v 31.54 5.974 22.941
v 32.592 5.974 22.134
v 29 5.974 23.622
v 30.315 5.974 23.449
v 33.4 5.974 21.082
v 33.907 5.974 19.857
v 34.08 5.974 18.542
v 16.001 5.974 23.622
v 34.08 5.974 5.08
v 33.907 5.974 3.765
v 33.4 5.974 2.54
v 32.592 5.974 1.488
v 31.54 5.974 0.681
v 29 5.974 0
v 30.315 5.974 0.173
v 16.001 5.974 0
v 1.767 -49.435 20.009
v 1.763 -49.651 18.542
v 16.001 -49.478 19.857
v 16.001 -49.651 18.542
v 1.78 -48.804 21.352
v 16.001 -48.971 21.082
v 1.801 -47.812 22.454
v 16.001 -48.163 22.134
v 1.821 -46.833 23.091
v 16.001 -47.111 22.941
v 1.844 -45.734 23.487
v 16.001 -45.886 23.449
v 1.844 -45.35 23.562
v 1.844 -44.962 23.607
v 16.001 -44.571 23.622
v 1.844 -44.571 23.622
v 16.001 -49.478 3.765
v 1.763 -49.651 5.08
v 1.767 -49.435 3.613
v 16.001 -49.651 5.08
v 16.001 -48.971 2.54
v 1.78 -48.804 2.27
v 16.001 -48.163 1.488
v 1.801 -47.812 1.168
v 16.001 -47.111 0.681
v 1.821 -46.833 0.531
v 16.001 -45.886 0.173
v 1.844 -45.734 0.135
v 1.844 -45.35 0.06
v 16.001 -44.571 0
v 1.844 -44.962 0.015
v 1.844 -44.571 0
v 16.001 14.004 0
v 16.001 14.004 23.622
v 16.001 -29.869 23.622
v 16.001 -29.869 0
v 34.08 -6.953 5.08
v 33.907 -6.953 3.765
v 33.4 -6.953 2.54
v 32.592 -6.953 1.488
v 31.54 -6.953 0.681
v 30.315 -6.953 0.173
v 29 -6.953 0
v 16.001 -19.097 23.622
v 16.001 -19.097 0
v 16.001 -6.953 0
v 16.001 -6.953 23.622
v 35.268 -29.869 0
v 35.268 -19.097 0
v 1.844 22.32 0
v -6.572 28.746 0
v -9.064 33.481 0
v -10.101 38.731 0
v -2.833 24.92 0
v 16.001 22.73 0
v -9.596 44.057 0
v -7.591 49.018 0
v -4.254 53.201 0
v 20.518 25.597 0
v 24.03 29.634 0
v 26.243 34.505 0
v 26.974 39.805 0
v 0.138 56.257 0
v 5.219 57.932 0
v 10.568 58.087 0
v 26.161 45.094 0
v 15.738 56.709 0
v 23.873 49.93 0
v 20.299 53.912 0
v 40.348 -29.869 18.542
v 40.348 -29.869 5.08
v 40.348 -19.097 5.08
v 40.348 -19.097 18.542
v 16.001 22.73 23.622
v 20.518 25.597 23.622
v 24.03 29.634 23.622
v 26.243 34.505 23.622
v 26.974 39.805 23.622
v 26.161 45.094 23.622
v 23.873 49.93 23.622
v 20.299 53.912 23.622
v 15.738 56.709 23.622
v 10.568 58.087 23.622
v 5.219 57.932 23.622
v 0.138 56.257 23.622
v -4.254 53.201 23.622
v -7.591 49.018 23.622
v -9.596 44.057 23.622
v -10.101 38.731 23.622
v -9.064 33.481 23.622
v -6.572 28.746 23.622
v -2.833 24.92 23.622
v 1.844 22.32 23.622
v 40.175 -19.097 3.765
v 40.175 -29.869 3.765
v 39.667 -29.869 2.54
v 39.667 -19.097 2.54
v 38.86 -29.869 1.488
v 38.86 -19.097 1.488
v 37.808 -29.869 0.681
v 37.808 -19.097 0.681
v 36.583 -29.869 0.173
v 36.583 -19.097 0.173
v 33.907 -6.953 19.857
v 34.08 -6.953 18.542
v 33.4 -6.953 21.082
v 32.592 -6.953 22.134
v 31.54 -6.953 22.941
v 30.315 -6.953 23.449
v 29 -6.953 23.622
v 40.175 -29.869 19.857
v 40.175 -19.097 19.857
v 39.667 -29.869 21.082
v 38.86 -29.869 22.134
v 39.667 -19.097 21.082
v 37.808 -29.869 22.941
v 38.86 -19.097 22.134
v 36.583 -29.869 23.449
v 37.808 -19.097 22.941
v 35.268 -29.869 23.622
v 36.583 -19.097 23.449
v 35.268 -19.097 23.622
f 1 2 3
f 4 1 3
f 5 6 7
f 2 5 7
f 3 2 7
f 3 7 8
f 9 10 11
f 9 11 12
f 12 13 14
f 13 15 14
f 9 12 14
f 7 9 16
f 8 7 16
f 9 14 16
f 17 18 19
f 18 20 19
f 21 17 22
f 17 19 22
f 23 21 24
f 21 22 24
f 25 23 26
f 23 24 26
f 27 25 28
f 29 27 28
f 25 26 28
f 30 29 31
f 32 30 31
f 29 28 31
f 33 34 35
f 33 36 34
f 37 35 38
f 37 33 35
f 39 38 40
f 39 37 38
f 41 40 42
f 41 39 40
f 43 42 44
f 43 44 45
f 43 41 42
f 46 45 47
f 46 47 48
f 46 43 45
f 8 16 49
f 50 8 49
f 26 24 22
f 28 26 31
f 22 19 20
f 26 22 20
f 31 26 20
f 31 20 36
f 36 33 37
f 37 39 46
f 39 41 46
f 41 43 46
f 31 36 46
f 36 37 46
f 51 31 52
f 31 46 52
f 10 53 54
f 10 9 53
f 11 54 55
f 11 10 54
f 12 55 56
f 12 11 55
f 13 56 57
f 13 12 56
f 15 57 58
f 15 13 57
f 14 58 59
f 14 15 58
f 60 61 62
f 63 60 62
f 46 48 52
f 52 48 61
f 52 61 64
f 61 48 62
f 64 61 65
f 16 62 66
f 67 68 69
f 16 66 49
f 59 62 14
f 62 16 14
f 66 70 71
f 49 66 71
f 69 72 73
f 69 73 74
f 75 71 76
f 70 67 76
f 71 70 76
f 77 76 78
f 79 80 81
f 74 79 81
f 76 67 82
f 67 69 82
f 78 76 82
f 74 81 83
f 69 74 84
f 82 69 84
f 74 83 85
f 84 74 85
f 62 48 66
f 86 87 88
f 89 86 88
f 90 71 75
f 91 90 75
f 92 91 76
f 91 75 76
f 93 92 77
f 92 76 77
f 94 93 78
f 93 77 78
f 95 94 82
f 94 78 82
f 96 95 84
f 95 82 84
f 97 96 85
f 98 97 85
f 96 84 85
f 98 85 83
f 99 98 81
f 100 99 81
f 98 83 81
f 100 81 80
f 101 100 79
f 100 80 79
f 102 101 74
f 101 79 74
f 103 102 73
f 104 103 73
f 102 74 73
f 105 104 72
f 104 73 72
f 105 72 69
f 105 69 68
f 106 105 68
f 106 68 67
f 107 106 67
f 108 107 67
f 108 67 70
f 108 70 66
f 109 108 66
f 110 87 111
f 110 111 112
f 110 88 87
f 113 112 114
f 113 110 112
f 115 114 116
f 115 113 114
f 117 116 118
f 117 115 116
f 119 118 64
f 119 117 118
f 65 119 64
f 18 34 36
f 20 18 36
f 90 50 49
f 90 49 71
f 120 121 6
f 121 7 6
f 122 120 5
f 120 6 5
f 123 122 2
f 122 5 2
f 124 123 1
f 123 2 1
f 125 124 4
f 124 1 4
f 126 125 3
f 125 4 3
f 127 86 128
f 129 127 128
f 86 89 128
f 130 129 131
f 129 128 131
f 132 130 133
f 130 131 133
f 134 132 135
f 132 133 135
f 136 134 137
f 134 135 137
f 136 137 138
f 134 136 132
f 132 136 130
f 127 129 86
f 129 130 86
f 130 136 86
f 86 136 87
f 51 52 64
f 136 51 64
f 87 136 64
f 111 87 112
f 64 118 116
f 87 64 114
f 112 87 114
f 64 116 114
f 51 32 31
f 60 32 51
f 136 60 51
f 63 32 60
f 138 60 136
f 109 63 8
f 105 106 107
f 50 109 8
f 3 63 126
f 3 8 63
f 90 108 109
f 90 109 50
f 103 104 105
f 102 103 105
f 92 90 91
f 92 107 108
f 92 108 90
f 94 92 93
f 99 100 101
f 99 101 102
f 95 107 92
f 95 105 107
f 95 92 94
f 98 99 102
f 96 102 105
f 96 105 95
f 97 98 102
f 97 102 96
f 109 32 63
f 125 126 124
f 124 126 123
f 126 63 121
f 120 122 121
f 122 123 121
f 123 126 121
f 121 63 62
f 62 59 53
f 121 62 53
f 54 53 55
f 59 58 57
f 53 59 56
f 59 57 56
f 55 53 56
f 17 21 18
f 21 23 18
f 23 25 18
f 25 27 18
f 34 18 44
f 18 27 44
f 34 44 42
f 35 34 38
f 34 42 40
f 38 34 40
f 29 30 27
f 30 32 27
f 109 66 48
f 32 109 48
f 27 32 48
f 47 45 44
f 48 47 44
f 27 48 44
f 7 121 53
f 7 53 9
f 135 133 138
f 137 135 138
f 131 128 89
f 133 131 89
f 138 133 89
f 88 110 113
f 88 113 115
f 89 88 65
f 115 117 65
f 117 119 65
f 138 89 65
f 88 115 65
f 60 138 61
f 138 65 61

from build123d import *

# Parameters (mm, degrees)
F1_DEPTH = 23.622
F2_R     = 5.08


with BuildPart() as f1:
    # F0 (on Top) → F1 (new body)
    with BuildSketch(Plane.XY):
        with BuildLine():
            Line((16.000509, 14.004066), (16.000509, 22.72998))
            ThreePointArc((16.000509, 22.72998), (7.887729, 58.203177), (1.843651, 22.31956))
            Line((1.843651, 22.31956), (1.843651, -45.733988))
            Line((1.843651, -45.733988), (1.762765, -49.65125))
            Line((1.762765, -49.65125), (16.000544, -49.65125))
            Line((16.000544, -49.65125), (16.000544, -29.869115))
            Line((16.000544, -29.869115), (40.347772, -29.869094))
            Line((40.347772, -29.869094), (40.347763, -19.096614))
            Line((40.347763, -19.096614), (16.000538, -19.096635))
            Line((16.000538, -19.096635), (16.000544, -6.953149))
            Line((16.000544, -6.953149), (34.080159, -6.953133))
            Line((34.080159, -6.953133), (34.080148, 5.973834))
            Line((34.080148, 5.973834), (16.000516, 5.973818))
            Line((16.000516, 5.973818), (16.000509, 14.004066))
        make_face()
    extrude(amount=F1_DEPTH)

    # F2
    f2_edges = [f1.edges().sort_by_distance(p)[0] for p in [
        (40.347768, -24.482854, 23.622),
        (34.080154, -0.48965, 23.622),
        (8.881655, -49.65125, 23.622),
        (34.080154, -0.48965, 0),
        (40.347768, -24.482854, 0),
        (8.881655, -49.65125, 0),
    ]]
    fillet(f2_edges, radius=F2_R)


solid = f1.part
